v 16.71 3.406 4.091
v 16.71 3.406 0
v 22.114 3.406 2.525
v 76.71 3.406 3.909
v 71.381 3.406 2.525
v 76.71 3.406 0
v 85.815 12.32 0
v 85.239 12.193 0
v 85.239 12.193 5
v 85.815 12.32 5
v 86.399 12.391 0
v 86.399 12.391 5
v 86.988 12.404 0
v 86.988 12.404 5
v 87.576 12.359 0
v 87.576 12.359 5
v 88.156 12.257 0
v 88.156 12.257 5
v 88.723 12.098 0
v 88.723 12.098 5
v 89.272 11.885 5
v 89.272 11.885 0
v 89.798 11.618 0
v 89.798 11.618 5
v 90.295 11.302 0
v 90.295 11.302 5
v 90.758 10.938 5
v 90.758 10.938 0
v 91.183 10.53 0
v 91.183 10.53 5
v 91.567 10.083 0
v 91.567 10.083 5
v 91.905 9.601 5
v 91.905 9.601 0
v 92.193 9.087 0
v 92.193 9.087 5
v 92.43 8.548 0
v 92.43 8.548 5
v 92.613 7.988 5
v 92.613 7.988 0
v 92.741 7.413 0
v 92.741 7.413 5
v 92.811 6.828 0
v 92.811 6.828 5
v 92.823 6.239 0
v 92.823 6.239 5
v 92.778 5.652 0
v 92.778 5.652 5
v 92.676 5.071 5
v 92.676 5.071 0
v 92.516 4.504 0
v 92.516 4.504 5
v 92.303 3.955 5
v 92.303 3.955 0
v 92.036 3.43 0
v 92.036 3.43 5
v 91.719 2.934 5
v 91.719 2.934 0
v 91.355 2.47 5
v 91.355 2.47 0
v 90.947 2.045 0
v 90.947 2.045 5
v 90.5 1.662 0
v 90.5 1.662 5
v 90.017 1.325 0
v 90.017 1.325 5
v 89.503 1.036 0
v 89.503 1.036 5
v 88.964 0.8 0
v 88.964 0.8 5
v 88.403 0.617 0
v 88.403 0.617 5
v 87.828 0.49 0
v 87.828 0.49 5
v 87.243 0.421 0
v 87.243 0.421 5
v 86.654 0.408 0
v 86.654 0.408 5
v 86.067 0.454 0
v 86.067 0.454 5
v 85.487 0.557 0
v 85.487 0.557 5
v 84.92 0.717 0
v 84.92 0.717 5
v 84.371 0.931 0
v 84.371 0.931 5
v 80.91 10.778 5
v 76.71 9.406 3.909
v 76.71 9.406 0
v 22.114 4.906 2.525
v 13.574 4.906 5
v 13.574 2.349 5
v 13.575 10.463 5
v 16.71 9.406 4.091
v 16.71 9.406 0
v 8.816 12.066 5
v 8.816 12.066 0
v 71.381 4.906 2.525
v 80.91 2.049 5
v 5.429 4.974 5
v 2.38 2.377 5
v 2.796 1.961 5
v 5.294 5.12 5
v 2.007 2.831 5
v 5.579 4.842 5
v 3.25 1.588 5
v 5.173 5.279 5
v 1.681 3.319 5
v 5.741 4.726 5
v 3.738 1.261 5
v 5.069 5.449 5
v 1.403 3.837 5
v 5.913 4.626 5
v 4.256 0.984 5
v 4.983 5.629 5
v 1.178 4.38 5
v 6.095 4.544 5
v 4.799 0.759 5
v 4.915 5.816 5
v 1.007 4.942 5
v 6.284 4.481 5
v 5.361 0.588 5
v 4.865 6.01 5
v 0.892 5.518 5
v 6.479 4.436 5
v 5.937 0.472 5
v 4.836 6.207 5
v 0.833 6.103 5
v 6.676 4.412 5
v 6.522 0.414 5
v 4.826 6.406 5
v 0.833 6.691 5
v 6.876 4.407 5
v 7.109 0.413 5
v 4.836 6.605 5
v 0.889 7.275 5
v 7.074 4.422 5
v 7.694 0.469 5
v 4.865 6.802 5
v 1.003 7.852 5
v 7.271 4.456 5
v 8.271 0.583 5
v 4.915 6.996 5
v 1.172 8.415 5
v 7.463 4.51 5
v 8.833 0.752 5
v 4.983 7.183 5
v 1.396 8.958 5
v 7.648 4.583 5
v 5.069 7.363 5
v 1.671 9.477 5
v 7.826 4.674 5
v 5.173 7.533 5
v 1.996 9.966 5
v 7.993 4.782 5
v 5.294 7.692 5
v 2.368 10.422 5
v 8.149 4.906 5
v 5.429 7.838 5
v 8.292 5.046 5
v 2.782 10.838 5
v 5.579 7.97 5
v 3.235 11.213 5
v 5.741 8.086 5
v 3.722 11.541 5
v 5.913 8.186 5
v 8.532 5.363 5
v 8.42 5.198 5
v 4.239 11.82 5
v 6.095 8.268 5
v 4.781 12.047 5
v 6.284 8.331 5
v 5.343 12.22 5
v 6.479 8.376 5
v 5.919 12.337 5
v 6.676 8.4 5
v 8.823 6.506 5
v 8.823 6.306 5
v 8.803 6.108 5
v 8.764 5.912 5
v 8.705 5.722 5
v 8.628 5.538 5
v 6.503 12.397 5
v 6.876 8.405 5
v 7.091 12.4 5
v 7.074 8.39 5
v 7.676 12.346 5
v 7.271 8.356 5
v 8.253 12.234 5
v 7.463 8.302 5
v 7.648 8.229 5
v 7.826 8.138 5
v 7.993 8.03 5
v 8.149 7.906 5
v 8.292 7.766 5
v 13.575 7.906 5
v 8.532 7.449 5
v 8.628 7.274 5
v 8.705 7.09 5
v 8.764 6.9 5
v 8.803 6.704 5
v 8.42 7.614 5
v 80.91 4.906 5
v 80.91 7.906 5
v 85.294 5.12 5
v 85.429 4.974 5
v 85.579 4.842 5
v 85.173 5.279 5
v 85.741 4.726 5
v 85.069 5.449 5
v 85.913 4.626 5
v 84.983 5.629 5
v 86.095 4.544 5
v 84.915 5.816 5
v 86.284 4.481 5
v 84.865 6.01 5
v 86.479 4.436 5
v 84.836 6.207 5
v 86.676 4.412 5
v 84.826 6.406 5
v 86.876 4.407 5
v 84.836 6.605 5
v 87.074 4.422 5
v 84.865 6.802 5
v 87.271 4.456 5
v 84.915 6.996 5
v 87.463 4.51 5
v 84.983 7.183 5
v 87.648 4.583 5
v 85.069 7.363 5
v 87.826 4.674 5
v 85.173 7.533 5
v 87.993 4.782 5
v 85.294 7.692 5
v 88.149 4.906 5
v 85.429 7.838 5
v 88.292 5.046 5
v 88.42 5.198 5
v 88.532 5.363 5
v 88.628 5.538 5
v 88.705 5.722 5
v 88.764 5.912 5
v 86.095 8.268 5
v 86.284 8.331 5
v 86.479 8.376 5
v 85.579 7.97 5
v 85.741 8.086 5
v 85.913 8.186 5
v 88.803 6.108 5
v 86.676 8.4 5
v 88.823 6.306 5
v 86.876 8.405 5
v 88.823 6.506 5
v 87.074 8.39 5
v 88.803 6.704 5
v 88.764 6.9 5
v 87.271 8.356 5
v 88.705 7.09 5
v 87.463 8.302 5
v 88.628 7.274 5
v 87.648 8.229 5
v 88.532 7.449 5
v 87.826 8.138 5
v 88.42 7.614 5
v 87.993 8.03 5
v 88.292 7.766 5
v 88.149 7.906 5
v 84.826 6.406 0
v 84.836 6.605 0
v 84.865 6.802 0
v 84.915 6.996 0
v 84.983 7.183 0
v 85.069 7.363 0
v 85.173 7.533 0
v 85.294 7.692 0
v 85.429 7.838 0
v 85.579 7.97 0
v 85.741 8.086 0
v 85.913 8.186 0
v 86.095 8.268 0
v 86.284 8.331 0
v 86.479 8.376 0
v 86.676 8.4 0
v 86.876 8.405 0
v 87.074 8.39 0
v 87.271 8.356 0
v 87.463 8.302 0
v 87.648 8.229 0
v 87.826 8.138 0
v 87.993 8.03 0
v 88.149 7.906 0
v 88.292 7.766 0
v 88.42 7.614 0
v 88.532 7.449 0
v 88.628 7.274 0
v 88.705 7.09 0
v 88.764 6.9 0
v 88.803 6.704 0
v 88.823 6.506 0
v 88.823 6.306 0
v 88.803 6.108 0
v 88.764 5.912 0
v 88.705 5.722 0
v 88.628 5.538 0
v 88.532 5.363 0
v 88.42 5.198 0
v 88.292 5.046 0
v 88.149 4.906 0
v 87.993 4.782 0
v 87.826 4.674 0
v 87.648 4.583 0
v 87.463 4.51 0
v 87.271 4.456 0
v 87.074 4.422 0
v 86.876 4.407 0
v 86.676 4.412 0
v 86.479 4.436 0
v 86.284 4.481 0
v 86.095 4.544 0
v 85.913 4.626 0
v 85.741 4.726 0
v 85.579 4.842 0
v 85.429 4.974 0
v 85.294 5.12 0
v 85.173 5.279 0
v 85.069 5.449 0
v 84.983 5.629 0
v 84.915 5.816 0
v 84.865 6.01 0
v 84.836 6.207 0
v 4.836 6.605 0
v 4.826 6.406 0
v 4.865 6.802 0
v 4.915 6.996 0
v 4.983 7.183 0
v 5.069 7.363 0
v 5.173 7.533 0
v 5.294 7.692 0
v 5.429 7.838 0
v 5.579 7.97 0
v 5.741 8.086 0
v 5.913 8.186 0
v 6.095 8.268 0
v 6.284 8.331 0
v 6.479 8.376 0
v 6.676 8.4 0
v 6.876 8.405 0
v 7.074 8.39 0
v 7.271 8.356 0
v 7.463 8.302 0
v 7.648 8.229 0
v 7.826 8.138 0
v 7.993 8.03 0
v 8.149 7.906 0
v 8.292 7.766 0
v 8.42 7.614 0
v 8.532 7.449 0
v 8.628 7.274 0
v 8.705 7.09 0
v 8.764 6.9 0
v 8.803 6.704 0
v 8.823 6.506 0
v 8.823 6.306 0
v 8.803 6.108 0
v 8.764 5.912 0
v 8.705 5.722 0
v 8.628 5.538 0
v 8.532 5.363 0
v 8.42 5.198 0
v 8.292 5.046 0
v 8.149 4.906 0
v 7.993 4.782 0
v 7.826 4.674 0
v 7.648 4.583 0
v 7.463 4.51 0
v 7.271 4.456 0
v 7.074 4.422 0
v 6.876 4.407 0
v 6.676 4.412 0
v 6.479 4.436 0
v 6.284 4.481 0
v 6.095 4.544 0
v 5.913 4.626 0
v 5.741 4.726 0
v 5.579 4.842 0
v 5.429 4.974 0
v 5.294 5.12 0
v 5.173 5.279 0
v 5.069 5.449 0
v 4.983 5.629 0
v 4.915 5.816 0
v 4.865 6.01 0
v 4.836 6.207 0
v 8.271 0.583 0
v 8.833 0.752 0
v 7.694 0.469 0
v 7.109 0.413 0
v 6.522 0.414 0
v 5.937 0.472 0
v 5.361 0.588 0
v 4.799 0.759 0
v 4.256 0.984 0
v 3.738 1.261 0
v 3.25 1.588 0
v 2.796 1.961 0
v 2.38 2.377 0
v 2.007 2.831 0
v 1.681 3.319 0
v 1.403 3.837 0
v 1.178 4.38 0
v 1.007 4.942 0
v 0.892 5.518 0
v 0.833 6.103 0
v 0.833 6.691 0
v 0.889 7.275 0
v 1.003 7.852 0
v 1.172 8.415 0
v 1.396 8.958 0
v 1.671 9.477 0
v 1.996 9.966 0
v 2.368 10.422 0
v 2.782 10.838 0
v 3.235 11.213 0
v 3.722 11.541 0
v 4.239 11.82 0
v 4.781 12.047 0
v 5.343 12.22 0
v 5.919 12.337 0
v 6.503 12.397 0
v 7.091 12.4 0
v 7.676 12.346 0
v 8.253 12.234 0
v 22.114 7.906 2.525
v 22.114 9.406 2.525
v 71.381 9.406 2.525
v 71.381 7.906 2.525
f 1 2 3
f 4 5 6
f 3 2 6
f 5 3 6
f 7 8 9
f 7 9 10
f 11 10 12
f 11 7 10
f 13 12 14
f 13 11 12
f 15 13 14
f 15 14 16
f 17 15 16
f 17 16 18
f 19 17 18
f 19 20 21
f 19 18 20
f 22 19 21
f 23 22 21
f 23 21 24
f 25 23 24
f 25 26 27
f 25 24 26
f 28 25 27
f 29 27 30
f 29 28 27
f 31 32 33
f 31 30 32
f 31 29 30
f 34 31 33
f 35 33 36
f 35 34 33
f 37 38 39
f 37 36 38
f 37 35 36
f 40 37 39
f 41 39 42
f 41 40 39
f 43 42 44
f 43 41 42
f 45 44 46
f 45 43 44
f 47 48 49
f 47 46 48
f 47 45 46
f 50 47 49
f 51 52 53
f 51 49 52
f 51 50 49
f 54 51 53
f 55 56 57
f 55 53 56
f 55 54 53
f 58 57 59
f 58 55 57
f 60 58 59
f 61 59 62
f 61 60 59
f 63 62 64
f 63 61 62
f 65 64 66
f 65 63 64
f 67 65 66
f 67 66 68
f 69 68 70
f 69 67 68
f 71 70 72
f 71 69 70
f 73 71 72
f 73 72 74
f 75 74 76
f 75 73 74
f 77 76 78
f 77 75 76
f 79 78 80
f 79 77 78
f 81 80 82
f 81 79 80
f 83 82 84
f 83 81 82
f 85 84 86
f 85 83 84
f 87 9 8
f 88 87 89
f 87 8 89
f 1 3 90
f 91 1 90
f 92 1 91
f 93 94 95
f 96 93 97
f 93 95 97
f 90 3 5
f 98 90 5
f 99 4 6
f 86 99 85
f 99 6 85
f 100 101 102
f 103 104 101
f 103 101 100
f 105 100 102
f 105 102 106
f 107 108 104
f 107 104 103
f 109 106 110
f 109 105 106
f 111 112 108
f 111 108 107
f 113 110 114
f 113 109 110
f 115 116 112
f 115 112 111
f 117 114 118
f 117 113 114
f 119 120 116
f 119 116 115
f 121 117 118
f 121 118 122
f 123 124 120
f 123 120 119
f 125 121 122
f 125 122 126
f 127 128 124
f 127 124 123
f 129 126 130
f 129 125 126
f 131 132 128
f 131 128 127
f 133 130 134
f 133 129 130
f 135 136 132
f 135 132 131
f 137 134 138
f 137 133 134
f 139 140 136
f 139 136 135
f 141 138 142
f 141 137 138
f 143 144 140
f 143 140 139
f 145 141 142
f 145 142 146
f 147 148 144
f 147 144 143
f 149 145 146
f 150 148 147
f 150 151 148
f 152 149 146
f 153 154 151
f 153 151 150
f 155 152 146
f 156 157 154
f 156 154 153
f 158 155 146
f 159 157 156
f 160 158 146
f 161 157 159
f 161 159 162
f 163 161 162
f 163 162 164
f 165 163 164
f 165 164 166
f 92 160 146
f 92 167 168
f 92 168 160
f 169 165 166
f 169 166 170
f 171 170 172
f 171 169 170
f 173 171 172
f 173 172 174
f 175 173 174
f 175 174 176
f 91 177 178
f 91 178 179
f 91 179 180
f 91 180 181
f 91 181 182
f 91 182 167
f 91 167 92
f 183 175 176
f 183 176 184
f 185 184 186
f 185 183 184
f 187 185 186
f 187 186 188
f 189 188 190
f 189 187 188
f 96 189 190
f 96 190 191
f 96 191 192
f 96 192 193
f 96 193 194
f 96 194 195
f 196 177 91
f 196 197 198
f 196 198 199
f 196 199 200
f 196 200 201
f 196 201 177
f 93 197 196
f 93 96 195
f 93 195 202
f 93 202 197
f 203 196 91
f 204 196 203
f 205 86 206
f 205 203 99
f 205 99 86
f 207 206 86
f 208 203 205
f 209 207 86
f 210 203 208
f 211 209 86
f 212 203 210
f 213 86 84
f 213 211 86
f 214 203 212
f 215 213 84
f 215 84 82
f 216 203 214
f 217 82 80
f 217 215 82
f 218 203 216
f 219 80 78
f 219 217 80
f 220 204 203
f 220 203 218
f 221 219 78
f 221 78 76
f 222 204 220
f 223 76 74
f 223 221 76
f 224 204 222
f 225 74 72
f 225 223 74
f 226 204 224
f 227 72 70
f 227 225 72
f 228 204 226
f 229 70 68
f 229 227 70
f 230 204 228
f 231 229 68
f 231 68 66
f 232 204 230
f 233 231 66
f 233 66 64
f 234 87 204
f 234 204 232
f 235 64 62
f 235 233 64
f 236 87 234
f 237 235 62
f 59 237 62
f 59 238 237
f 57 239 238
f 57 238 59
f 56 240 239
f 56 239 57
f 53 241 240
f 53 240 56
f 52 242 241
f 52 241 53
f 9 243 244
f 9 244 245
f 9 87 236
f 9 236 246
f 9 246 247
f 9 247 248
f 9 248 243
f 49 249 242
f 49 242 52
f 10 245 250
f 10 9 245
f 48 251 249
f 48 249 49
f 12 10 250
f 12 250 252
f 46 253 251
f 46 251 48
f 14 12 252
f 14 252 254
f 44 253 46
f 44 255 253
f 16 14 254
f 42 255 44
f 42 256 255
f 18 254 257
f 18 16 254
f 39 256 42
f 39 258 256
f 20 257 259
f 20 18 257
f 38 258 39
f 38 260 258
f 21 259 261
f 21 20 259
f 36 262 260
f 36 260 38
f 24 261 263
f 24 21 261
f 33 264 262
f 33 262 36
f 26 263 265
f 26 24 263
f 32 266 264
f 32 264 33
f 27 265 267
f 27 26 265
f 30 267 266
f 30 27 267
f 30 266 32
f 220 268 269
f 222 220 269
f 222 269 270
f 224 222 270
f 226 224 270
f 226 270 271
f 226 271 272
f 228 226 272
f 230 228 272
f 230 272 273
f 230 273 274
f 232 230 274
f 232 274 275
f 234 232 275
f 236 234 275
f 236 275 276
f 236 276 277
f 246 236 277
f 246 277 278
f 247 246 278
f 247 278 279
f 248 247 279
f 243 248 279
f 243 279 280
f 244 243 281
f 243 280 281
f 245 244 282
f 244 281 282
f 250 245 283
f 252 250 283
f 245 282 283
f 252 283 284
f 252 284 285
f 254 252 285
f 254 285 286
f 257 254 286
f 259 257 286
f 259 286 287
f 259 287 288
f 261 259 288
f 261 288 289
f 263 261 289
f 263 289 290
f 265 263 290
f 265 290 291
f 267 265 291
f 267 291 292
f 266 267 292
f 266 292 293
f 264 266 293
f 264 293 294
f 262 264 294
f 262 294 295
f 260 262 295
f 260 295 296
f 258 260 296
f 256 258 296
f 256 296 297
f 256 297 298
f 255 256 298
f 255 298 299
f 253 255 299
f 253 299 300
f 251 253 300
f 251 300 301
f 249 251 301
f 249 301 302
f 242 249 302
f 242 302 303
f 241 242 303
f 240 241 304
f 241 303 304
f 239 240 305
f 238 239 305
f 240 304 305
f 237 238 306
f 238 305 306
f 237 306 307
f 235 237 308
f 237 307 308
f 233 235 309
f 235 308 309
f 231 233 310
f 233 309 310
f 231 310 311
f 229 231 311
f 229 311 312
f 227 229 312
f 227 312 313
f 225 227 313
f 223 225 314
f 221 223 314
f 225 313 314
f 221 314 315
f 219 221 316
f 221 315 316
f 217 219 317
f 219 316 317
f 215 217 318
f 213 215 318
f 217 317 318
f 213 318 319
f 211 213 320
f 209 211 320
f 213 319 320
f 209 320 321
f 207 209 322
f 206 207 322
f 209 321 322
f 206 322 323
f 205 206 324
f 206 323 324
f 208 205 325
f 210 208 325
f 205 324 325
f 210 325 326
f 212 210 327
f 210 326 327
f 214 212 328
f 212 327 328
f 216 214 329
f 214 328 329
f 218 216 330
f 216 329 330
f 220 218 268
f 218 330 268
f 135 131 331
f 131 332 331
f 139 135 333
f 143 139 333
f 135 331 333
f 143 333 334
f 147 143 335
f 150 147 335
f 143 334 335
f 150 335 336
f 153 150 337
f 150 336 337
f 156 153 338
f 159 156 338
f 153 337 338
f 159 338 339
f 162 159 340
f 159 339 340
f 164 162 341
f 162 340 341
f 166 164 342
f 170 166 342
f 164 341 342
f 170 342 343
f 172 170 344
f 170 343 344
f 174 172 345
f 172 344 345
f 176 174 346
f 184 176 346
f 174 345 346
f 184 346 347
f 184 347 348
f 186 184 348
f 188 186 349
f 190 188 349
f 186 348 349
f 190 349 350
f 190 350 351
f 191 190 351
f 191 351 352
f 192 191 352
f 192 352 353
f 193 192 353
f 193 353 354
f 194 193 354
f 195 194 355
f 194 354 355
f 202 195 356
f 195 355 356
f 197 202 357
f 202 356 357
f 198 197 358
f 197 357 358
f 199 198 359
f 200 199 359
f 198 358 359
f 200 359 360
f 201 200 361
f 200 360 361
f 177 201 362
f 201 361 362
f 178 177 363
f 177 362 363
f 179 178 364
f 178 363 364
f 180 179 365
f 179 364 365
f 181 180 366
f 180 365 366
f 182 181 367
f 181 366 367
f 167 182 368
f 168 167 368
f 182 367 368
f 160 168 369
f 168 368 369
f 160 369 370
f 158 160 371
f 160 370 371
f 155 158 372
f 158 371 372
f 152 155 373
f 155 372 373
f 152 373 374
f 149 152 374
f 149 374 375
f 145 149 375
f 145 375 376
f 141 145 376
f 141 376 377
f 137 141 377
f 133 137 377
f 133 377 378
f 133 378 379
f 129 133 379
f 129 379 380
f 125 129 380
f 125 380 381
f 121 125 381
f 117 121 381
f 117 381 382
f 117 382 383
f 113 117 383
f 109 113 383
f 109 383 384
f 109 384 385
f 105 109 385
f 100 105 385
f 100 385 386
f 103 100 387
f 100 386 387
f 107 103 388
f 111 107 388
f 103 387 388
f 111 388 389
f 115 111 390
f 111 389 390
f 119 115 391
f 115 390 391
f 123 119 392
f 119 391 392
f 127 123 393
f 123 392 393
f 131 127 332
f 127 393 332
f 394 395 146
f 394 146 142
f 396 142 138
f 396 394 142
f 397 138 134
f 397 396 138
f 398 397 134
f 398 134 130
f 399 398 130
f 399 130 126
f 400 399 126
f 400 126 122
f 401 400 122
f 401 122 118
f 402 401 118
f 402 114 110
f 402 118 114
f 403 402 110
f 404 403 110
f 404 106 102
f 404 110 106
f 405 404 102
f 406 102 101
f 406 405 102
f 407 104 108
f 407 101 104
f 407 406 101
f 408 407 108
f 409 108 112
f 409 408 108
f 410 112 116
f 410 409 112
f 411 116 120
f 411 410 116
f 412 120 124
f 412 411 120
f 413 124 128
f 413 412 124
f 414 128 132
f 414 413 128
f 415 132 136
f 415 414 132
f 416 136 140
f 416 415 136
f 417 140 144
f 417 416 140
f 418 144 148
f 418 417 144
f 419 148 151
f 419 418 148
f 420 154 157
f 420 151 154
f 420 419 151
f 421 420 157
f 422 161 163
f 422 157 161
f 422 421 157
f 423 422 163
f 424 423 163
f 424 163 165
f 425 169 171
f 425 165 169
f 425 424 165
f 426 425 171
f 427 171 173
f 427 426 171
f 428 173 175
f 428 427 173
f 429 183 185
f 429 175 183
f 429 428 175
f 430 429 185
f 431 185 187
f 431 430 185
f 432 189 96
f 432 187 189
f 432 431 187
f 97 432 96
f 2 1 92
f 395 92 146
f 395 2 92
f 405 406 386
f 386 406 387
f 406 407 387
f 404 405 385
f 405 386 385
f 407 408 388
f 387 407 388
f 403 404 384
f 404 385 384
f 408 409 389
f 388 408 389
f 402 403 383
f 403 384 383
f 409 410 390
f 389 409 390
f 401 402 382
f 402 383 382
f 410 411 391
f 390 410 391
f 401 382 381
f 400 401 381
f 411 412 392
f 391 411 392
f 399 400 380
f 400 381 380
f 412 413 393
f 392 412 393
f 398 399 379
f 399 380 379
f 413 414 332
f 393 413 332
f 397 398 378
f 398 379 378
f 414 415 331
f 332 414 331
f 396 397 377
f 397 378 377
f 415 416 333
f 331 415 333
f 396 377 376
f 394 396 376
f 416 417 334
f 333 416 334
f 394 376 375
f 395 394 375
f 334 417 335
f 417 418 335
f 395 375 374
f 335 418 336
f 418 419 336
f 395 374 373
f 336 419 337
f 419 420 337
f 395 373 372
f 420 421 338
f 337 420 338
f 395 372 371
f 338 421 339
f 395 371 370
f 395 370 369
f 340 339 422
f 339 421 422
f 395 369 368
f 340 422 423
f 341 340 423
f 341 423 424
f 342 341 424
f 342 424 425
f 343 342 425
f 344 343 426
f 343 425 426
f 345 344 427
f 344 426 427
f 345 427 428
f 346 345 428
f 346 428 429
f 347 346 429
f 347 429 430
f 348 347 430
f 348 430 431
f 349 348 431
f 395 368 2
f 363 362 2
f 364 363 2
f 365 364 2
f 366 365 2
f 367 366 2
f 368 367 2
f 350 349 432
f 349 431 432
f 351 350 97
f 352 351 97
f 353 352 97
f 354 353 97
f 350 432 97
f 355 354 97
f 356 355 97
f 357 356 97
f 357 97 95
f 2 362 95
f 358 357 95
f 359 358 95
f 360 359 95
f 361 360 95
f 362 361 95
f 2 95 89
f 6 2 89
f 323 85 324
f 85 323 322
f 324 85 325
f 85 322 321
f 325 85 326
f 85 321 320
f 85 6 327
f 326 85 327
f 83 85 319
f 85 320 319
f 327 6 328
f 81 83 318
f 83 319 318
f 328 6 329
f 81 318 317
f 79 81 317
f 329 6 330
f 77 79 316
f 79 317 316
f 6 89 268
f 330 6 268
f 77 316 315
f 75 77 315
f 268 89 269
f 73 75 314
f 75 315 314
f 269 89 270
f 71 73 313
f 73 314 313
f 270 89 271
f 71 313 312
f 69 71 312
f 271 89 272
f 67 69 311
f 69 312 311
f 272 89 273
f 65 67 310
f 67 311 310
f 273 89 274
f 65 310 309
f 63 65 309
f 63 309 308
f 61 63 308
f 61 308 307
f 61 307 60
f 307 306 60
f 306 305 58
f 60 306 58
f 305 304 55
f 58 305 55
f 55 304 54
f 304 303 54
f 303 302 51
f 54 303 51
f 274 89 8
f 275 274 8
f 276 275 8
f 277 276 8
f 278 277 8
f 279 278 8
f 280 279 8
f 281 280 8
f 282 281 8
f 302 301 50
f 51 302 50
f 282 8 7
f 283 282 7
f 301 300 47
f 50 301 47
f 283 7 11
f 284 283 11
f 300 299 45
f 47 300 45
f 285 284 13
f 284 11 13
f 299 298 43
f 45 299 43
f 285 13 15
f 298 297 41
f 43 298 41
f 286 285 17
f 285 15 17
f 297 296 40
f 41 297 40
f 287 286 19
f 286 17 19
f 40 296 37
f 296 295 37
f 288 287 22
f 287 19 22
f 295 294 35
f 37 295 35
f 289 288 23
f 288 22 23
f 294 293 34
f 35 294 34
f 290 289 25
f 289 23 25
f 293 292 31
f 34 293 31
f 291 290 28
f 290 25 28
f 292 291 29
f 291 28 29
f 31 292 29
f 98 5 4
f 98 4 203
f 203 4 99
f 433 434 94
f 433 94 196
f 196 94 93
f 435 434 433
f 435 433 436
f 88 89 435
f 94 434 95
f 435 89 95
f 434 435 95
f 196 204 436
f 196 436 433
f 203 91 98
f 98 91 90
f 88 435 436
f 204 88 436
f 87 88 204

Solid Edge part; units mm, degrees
sketch "Sketch1" plane through (0, 0, 0) normal (0, 0, -1) x (-1, 0, 0)
  circle A0 centre (-6.8258, 6.406) radius 2
  line L0 (-76.7103, 9.406) -> (-16.7103, 9.406)
  line L1 (-16.7103, 9.406) -> (-8.8158, 12.0664)
  line L2 (-16.7103, 3.406) -> (-8.8333, 0.7518)
  line L3 (-16.7103, 3.406) -> (-76.7103, 3.406)
  line L4 (-76.7103, 3.406) -> (-84.3711, 0.9311)
  line L5 (-85.2395, 12.1925) -> (-76.7103, 9.406)
  arc A1 (-8.8158, 12.0664) -> (-8.8333, 0.7518) centre (-6.8258, 6.406) cw
  arc A2 (-84.3711, 0.9311) -> (-85.2395, 12.1925) centre (-86.8258, 6.406) cw
  circle A3 centre (-86.8258, 6.406) radius 2
  dimension "D1" = 80
  dimension "D2" = 4
  dimension "D3" = 60
  dimension "D4" = 4
  dimension "D5" = 6
  dimension "D6" = 6
  dimension "D7" = 60
  dimension "D8" = 6
extrude "Protrusion1" add sketch "Sketch1" against normal blind 5
sketch "Sketch2" plane through (46.7103, 3.406, 2.5) normal (0, -1, 0) x (1, 0, 0)
  line L0 (-34.5366, 2.906) -> (-24.5967, 0.0249)
  line L1 (-24.5967, 0.0249) -> (24.6704, 0.0249)
  line L2 (24.6704, 0.0249) -> (35.7626, 2.906)
extrude "Enlèvement_matière_1" cut sketch "Sketch2" against normal blind 1.5 and the other way through all material side at (17.1576, 3.406, 4.0135)
sketch "Sketch3" plane through (46.7103, 9.406, 2.5) normal (0, 1, 0) x (-1, 0, 0)
  line L0 (-24.6704, 0.0249) -> (-34.1994, 2.5)
  line L1 (24.5967, 0.0249) -> (-24.6704, 0.0249)
  line L2 (33.1357, 2.5) -> (24.5967, 0.0249)
extrude "Enlèvement_matière_2" cut sketch "Sketch3" against normal blind 1.5 and the other way blind 16.364 material side at (76.1326, 9.406, 3.8108)
properties part number "AC_1.05"
